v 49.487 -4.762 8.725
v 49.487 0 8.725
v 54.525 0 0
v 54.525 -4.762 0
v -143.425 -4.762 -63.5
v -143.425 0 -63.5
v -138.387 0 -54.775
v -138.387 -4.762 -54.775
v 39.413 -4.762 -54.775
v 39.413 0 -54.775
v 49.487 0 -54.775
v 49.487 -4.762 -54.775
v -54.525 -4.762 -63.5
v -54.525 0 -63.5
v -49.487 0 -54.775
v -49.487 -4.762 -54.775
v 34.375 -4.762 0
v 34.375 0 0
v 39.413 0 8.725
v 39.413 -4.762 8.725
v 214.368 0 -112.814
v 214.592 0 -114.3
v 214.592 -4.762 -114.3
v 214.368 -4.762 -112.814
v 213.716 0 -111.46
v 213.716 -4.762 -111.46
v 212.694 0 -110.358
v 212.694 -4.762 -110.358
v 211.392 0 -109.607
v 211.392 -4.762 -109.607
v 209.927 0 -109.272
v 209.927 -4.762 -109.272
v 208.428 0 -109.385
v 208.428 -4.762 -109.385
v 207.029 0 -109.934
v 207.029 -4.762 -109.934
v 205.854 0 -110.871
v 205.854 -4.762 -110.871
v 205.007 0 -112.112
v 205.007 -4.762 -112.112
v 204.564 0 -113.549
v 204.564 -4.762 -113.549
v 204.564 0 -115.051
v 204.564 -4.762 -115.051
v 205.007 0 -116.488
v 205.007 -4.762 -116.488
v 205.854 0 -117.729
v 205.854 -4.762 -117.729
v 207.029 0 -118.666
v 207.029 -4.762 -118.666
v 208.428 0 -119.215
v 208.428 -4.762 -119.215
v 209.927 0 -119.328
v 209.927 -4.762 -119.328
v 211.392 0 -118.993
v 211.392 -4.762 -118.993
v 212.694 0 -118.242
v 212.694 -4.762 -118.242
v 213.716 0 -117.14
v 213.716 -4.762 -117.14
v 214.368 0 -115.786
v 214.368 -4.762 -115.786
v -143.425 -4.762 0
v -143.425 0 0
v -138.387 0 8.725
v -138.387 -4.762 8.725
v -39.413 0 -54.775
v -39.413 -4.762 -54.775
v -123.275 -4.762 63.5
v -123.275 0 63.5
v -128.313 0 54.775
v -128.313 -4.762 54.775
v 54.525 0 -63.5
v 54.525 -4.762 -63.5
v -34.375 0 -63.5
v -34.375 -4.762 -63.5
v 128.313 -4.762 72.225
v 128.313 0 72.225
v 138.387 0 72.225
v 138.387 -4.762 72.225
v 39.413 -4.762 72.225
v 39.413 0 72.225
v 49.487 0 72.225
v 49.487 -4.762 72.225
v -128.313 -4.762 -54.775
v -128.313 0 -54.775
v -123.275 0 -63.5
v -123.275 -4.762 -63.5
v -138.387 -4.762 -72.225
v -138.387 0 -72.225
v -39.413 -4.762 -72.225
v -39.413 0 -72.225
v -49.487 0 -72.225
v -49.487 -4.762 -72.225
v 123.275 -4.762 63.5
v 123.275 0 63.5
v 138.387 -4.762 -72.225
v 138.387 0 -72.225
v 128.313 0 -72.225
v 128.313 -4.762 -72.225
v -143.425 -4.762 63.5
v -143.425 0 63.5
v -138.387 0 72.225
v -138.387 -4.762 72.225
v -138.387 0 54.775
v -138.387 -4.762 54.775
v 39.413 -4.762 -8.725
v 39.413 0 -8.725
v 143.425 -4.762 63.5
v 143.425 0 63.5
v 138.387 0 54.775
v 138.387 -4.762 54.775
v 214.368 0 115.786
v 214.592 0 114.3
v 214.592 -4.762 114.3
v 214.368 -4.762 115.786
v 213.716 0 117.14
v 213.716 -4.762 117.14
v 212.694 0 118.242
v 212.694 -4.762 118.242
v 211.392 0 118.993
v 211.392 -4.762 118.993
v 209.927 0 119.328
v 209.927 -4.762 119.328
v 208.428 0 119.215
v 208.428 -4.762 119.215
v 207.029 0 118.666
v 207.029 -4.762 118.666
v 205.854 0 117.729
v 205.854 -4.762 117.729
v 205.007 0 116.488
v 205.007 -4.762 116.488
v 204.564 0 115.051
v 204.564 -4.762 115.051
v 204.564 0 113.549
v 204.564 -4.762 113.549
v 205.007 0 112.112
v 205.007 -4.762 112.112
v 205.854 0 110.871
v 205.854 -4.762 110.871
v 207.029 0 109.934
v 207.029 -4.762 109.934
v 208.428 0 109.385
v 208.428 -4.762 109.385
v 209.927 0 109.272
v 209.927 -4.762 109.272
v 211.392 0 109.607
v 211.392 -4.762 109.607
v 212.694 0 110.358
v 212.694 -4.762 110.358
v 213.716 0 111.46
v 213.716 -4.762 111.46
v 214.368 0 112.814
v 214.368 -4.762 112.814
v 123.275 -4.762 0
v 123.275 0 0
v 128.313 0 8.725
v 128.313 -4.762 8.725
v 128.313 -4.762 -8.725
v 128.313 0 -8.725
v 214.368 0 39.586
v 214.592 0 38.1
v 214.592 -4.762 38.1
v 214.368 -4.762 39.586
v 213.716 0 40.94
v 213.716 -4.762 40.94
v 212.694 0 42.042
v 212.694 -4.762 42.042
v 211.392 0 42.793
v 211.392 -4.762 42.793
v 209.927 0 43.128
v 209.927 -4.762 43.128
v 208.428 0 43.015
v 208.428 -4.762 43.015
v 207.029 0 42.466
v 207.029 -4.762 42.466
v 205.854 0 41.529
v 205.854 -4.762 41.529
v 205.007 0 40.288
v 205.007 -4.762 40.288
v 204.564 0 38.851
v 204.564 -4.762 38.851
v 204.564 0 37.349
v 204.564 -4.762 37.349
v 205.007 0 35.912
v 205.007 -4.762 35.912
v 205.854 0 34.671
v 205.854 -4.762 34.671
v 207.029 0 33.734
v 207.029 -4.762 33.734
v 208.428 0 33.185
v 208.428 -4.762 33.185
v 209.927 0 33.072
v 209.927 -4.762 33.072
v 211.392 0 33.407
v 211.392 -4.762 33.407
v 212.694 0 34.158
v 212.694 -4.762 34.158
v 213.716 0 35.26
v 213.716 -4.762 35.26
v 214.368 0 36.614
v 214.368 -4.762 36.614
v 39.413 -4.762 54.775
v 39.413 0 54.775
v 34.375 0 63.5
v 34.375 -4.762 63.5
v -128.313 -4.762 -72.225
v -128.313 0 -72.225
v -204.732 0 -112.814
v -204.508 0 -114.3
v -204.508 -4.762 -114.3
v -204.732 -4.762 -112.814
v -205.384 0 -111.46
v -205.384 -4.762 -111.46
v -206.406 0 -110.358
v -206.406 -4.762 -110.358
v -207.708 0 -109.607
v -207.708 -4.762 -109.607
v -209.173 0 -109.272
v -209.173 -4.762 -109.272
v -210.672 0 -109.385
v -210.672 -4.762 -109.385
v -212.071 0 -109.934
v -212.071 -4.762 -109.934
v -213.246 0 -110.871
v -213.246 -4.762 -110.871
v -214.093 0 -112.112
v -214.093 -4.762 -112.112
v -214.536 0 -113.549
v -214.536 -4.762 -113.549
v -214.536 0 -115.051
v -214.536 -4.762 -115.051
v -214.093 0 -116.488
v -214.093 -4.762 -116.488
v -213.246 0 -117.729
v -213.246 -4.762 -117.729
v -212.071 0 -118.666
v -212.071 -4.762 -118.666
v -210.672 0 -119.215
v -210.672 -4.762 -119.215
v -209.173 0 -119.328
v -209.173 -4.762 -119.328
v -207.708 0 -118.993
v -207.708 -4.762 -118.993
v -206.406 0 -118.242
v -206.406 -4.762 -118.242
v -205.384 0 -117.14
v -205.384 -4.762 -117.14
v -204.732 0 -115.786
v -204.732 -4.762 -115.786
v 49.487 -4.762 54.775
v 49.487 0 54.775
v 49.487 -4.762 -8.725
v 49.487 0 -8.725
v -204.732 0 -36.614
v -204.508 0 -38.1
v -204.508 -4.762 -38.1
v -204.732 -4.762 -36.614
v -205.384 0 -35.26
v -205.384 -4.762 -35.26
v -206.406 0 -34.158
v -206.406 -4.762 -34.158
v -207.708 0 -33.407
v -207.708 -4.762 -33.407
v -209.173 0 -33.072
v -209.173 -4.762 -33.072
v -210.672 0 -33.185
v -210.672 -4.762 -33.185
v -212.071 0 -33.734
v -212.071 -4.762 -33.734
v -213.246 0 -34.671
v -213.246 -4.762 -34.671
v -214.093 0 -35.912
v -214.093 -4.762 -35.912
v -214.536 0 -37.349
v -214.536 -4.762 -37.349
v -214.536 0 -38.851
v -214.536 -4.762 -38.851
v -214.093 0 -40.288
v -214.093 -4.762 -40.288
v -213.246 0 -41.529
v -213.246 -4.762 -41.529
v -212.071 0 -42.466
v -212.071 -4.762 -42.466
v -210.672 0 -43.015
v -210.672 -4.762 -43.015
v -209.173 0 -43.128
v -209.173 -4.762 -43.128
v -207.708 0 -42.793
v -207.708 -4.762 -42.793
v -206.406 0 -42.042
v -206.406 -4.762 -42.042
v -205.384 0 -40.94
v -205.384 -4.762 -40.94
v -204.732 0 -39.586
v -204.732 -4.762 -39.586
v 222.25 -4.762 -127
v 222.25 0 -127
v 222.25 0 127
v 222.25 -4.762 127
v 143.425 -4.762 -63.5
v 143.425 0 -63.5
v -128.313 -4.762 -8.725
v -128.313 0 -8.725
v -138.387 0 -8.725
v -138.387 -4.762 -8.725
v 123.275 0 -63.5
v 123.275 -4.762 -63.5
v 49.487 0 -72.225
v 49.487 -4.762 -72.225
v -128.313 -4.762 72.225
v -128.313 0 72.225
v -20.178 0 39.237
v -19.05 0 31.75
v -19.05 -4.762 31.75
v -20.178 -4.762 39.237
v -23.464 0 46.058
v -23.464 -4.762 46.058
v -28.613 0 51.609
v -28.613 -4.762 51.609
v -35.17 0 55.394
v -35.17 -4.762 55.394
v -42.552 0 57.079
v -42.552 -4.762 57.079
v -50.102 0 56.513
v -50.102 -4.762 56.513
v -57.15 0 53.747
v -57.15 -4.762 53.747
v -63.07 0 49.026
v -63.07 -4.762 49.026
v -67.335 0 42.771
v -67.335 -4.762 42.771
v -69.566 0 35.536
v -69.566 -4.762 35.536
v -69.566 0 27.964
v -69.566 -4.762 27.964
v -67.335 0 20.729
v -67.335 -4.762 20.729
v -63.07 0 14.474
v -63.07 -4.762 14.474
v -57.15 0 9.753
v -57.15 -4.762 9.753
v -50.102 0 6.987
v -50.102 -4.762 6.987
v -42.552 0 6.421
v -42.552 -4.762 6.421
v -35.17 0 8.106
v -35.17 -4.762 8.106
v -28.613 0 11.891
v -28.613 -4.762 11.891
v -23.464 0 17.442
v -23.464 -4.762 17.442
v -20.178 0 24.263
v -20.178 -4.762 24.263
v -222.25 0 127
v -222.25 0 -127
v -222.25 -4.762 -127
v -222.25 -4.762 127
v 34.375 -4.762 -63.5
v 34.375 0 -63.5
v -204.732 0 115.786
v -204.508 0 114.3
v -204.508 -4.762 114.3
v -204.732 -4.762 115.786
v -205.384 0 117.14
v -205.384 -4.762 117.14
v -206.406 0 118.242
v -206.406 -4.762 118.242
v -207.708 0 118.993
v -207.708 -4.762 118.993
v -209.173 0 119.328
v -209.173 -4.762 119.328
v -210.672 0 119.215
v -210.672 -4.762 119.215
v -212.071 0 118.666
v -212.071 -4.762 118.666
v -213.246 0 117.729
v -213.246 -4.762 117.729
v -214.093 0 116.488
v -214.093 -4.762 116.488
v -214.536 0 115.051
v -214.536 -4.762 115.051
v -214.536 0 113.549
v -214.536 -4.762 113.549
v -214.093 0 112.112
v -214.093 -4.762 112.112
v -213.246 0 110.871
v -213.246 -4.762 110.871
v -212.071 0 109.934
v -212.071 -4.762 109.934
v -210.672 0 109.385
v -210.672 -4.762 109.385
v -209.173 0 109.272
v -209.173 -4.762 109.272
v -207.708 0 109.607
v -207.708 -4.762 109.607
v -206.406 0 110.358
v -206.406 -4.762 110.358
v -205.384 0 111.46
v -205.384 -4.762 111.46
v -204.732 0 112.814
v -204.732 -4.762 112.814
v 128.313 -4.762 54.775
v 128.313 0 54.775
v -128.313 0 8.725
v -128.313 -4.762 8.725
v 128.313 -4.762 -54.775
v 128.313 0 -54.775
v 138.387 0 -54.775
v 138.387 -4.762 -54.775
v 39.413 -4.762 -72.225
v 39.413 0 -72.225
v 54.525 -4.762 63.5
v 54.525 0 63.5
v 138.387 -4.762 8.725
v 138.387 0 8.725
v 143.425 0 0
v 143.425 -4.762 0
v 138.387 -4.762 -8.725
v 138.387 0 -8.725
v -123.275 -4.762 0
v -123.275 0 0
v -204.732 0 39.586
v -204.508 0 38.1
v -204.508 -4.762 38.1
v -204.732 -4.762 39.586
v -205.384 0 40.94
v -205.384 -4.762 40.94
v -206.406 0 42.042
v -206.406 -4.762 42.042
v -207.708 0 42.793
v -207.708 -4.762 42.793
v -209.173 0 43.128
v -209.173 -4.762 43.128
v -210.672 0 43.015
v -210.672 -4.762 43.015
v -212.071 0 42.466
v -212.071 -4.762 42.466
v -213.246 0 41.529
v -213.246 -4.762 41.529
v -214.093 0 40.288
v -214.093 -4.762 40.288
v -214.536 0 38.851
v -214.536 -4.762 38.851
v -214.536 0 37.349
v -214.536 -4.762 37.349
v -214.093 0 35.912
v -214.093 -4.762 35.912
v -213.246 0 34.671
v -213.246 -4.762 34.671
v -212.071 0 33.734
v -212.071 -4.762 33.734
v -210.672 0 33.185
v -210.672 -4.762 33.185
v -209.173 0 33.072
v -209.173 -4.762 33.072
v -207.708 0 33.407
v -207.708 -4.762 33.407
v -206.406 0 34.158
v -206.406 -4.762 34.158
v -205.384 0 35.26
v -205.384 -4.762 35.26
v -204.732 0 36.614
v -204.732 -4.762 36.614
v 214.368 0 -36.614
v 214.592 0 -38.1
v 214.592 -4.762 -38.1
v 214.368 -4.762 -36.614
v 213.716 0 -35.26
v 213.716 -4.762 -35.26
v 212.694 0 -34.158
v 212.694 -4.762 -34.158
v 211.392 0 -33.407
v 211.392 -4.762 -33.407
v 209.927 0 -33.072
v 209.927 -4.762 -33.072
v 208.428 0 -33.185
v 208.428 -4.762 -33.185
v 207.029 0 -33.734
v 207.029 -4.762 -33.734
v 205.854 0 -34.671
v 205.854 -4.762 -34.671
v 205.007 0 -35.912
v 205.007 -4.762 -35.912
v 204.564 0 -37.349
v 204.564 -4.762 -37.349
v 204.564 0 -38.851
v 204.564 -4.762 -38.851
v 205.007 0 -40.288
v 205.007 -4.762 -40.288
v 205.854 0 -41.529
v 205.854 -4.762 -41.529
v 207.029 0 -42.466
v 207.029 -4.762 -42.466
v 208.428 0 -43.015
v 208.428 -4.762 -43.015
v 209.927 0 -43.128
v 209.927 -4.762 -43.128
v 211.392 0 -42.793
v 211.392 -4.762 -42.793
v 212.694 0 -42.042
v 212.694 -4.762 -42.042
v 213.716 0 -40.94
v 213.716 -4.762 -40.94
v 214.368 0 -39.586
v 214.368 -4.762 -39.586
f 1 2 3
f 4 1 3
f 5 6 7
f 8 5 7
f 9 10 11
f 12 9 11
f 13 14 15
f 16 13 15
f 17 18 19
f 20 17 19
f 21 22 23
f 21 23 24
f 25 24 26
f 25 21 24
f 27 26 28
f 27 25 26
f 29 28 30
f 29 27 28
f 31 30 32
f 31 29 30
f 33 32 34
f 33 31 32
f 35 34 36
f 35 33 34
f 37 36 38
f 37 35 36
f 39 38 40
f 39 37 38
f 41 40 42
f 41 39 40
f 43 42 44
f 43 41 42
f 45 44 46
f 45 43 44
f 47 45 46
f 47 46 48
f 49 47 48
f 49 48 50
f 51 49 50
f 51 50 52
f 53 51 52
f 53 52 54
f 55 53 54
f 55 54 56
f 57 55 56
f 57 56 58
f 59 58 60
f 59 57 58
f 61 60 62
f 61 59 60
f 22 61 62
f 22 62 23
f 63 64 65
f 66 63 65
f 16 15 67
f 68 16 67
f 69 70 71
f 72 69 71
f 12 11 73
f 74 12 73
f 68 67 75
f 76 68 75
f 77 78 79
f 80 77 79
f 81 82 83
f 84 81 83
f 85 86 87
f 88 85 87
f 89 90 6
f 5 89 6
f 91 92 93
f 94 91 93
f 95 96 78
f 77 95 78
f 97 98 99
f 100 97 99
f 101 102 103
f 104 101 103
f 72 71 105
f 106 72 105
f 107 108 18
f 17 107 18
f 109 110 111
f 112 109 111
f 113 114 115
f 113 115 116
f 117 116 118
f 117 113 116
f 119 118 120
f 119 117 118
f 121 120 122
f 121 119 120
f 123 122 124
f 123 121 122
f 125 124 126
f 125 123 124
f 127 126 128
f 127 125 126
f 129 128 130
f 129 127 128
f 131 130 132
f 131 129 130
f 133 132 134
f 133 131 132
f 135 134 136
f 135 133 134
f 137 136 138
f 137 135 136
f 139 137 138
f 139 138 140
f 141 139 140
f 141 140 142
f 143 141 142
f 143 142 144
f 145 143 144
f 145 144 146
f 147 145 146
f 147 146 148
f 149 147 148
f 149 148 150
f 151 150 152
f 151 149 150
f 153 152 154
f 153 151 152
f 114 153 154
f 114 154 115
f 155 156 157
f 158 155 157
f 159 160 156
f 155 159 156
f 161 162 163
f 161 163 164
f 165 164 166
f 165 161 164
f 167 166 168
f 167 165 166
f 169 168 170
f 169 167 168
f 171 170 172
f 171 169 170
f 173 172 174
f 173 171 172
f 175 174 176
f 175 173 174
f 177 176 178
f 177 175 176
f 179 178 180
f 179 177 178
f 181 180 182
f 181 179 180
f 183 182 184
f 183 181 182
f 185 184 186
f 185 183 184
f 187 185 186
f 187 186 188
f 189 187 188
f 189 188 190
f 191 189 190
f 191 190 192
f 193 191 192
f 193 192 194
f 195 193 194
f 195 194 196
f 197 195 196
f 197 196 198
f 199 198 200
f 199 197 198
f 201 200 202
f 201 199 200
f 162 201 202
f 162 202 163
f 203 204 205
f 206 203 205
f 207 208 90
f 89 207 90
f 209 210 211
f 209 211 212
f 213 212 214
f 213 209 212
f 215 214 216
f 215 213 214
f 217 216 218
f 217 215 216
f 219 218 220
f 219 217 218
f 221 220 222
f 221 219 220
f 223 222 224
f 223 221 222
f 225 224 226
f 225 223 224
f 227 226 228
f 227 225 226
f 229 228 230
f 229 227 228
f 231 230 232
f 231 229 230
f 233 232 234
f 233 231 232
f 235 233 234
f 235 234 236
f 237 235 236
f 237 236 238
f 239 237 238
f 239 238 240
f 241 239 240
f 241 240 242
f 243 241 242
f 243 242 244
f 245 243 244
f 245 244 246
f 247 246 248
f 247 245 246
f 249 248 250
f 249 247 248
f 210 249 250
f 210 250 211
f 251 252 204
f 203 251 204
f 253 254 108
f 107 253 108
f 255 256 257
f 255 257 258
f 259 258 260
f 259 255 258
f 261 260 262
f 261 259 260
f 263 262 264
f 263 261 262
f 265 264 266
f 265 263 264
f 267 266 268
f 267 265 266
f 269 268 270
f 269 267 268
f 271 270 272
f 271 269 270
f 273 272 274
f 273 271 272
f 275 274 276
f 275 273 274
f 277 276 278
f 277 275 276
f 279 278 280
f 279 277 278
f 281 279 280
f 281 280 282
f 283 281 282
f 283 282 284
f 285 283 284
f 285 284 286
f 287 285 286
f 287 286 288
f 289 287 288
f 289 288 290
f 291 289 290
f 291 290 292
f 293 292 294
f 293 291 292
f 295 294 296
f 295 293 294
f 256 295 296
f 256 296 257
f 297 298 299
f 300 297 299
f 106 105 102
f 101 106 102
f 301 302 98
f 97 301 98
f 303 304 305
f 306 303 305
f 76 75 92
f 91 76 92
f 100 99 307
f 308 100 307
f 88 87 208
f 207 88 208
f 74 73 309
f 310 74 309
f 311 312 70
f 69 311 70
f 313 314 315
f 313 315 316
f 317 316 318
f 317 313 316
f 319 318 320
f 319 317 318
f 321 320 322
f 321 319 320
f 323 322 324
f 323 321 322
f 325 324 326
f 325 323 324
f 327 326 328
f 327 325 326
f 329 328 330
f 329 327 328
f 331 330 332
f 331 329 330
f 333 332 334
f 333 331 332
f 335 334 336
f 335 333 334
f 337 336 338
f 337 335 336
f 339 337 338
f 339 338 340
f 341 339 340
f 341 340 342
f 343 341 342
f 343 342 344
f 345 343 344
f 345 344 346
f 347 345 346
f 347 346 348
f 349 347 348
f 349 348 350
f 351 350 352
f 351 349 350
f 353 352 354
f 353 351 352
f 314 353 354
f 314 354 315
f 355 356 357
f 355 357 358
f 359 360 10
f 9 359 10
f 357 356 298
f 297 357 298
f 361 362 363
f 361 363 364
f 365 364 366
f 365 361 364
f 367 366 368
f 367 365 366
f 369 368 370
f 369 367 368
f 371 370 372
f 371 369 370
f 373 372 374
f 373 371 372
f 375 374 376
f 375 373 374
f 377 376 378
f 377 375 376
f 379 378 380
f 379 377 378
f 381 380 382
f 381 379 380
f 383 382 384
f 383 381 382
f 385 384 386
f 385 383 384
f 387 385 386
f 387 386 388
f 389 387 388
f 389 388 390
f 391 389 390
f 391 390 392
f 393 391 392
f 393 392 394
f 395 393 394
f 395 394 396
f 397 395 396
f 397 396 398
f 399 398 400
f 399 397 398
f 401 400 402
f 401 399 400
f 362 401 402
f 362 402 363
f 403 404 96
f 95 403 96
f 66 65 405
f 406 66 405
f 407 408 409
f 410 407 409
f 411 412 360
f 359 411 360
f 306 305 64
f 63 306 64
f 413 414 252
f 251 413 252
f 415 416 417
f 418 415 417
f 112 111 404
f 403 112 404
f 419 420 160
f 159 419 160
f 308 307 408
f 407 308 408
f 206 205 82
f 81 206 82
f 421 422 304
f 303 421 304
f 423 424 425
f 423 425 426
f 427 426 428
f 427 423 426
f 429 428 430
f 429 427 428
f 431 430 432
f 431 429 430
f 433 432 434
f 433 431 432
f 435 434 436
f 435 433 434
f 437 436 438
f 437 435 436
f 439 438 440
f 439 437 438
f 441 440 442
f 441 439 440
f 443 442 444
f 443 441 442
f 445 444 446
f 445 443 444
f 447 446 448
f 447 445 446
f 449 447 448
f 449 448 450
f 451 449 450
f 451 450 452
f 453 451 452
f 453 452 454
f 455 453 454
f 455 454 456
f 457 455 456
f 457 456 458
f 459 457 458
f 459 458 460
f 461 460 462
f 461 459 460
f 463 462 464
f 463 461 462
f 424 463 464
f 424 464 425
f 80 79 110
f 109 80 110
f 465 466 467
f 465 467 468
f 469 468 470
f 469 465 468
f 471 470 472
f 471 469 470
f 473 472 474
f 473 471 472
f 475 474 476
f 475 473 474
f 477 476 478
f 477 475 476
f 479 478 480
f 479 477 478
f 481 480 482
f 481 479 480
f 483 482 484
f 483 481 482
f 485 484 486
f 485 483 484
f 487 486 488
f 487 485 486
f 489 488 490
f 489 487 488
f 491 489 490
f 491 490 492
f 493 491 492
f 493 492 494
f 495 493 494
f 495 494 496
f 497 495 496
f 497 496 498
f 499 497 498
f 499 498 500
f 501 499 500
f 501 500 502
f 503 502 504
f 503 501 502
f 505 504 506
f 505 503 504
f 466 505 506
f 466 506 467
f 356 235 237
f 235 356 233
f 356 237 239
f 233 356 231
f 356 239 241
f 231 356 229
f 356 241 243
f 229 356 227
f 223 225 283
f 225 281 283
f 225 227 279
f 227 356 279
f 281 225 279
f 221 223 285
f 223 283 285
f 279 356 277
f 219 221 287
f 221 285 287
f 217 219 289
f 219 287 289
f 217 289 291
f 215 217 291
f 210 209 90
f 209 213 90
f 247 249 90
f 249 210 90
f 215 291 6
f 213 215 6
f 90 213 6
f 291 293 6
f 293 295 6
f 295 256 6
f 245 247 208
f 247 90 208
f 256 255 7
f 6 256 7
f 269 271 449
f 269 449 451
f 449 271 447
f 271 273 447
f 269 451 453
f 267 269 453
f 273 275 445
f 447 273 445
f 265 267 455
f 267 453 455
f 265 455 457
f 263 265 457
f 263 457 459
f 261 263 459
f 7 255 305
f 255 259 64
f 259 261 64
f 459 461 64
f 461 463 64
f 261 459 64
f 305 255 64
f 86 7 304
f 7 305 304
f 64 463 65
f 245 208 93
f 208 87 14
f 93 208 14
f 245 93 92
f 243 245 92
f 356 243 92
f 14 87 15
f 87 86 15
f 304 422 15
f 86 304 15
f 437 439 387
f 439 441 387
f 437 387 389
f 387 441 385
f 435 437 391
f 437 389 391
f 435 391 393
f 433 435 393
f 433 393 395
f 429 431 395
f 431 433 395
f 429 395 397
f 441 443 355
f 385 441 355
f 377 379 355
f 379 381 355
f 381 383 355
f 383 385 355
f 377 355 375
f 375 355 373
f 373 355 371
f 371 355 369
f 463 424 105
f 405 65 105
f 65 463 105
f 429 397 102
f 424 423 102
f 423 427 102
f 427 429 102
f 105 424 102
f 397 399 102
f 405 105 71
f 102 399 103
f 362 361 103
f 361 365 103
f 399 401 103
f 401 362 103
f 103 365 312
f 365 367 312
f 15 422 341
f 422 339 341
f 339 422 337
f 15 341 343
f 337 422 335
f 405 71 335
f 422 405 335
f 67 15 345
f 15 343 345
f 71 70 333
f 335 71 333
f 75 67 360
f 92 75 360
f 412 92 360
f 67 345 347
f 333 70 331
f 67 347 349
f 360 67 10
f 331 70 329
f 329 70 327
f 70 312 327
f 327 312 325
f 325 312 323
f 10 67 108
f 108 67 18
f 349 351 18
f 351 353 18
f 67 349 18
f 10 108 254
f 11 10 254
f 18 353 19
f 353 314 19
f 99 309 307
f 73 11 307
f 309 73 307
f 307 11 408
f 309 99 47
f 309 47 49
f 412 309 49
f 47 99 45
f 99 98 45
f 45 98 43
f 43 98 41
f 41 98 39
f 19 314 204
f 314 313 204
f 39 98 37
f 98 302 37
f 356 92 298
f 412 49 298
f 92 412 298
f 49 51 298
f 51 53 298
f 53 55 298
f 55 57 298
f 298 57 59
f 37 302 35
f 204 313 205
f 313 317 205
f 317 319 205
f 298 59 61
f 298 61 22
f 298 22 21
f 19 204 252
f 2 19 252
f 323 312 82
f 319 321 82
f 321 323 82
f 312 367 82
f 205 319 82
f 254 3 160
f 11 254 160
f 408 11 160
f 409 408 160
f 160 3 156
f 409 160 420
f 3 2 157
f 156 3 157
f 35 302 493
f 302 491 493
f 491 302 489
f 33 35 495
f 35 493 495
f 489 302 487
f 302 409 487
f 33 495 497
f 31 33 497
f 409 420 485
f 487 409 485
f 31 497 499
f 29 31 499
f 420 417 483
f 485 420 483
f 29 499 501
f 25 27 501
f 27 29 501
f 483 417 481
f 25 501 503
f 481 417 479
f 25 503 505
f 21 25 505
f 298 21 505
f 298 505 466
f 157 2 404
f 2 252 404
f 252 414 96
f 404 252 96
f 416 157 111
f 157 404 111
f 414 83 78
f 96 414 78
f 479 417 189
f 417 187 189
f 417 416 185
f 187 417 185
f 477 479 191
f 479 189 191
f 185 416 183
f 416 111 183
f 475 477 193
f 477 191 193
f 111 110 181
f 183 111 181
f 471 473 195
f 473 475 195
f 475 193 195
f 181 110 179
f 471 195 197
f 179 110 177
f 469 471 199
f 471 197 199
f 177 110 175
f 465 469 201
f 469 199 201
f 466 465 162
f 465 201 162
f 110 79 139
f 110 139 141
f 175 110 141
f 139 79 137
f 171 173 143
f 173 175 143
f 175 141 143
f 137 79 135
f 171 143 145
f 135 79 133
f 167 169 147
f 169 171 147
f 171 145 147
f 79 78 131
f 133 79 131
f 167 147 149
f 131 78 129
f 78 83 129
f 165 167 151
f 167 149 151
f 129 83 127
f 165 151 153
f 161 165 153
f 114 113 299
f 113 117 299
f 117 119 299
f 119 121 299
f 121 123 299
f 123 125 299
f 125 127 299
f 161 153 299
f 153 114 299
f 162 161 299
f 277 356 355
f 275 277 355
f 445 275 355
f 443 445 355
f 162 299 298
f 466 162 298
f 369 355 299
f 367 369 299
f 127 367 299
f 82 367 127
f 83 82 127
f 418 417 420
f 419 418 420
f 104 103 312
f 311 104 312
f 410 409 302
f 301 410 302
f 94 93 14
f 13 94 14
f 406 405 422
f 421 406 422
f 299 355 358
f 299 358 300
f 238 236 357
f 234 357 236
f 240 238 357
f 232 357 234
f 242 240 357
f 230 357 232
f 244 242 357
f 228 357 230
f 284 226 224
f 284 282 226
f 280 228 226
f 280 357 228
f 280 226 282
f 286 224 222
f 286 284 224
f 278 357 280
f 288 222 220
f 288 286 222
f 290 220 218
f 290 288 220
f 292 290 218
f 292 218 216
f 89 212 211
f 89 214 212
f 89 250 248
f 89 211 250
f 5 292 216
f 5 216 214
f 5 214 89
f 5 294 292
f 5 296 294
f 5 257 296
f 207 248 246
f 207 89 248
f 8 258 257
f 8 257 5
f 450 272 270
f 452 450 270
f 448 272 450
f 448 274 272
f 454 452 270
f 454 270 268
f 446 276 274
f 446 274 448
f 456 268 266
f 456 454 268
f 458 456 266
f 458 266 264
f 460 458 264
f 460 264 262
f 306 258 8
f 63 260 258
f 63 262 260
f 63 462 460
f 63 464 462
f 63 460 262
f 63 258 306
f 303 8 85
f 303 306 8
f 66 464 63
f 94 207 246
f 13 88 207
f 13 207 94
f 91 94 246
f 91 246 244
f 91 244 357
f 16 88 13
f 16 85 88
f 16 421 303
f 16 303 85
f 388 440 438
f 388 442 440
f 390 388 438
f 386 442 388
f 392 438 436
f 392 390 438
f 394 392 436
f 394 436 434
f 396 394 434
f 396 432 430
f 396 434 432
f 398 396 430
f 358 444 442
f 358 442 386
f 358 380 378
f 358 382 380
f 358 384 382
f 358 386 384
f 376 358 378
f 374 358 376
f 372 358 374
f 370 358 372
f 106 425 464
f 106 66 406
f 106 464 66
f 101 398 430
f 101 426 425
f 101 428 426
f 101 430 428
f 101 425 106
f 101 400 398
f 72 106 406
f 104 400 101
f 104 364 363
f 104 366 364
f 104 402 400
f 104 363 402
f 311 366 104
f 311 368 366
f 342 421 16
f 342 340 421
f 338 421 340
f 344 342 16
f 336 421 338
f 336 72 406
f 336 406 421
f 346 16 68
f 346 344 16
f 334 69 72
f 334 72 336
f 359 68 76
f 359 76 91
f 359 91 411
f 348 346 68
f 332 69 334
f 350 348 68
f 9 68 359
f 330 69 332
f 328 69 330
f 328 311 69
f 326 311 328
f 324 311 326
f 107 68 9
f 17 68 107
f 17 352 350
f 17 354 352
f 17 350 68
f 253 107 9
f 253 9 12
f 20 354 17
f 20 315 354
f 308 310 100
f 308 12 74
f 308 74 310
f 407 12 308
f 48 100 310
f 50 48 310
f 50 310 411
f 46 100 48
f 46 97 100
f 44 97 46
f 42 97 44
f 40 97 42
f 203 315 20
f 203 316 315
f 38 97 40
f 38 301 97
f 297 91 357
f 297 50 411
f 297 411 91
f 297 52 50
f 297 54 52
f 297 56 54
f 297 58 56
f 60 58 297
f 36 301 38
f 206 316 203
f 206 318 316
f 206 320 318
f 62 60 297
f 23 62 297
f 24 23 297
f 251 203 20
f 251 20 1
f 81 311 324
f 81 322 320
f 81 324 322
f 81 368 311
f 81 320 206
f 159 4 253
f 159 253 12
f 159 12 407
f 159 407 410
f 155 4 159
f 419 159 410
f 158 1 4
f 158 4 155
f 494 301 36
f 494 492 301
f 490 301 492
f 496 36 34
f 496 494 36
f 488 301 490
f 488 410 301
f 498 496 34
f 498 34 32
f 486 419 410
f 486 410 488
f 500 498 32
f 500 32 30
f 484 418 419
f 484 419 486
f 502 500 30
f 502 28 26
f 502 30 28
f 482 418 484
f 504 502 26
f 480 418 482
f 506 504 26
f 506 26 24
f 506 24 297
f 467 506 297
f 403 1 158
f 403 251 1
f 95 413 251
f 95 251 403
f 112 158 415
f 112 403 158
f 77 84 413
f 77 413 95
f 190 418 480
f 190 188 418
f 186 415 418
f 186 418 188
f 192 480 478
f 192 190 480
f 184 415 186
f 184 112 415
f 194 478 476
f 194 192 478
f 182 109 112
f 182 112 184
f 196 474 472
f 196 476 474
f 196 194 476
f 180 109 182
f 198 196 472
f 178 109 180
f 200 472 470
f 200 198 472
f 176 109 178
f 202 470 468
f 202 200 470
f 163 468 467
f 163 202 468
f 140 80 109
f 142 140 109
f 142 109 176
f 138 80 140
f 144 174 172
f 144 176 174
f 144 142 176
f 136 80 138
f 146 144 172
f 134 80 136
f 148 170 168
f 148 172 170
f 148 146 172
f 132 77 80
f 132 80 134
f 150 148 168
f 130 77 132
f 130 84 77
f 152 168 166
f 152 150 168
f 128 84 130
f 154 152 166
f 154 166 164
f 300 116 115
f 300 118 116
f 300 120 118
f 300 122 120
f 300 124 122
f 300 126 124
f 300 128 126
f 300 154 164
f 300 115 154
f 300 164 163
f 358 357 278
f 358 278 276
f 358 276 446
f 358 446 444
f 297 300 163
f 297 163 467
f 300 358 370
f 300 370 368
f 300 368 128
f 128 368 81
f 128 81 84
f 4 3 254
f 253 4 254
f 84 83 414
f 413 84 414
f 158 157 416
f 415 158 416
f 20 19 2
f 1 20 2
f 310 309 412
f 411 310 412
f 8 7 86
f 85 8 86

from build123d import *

# Parameters (mm, degrees)
F0_W     = 444.5
F0_H     = 254
F0_R     = 5.0419
F0_R_2   = 25.4
F1_DEPTH = 4.7625


with BuildPart() as f1:
    # F0 (on Front) → F1 (new body)
    with BuildSketch(Plane.XZ):
        Rectangle(F0_W, F0_H)
        with Locations((-209.55, -114.3)):
            Circle(F0_R, mode=Mode.SUBTRACT)
        with Locations((-209.55, -38.1)):
            Circle(F0_R, mode=Mode.SUBTRACT)
        Polygon((-143.424647, -63.5), (-138.387323, -54.7751), (-128.312677, -54.7751), (-123.275353, -63.5), (-128.312677, -72.2249), (-138.387323, -72.2249), align=None, mode=Mode.SUBTRACT)
        Polygon((-54.524647, -63.5), (-49.487323, -54.7751), (-39.412677, -54.7751), (-34.375353, -63.5), (-39.412677, -72.2249), (-49.487323, -72.2249), align=None, mode=Mode.SUBTRACT)
        with Locations((209.55, -114.3)):
            Circle(F0_R, mode=Mode.SUBTRACT)
        Polygon((34.375353, -63.5), (39.412677, -54.7751), (49.487323, -54.7751), (54.524647, -63.5), (49.487323, -72.2249), (39.412677, -72.2249), align=None, mode=Mode.SUBTRACT)
        Polygon((123.275353, -63.5), (128.312677, -54.7751), (138.387323, -54.7751), (143.424647, -63.5), (138.387323, -72.2249), (128.312677, -72.2249), align=None, mode=Mode.SUBTRACT)
        with Locations((209.55, -38.1)):
            Circle(F0_R, mode=Mode.SUBTRACT)
        Polygon((-143.424647, 0), (-138.387323, 8.7249), (-128.312677, 8.7249), (-123.275353, 0), (-128.312677, -8.7249), (-138.387323, -8.7249), align=None, mode=Mode.SUBTRACT)
        with Locations((-209.55, 38.1)):
            Circle(F0_R, mode=Mode.SUBTRACT)
        with Locations((-44.45, 31.75)):
            Circle(F0_R_2, mode=Mode.SUBTRACT)
        Polygon((-143.424647, 63.5), (-138.387323, 72.2249), (-128.312677, 72.2249), (-123.275353, 63.5), (-128.312677, 54.7751), (-138.387323, 54.7751), align=None, mode=Mode.SUBTRACT)
        with Locations((-209.55, 114.3)):
            Circle(F0_R, mode=Mode.SUBTRACT)
        Polygon((34.375353, 0), (39.412677, 8.7249), (49.487323, 8.7249), (54.524647, 0), (49.487323, -8.7249), (39.412677, -8.7249), align=None, mode=Mode.SUBTRACT)
        Polygon((123.275353, 0), (128.312677, 8.7249), (138.387323, 8.7249), (143.424647, 0), (138.387323, -8.7249), (128.312677, -8.7249), align=None, mode=Mode.SUBTRACT)
        with Locations((209.55, 38.1)):
            Circle(F0_R, mode=Mode.SUBTRACT)
        Polygon((34.375353, 63.5), (39.412677, 72.2249), (49.487323, 72.2249), (54.524647, 63.5), (49.487323, 54.7751), (39.412677, 54.7751), align=None, mode=Mode.SUBTRACT)
        Polygon((123.275353, 63.5), (128.312677, 72.2249), (138.387323, 72.2249), (143.424647, 63.5), (138.387323, 54.7751), (128.312677, 54.7751), align=None, mode=Mode.SUBTRACT)
        with Locations((209.55, 114.3)):
            Circle(F0_R, mode=Mode.SUBTRACT)
    extrude(amount=F1_DEPTH)


solid = f1.part
